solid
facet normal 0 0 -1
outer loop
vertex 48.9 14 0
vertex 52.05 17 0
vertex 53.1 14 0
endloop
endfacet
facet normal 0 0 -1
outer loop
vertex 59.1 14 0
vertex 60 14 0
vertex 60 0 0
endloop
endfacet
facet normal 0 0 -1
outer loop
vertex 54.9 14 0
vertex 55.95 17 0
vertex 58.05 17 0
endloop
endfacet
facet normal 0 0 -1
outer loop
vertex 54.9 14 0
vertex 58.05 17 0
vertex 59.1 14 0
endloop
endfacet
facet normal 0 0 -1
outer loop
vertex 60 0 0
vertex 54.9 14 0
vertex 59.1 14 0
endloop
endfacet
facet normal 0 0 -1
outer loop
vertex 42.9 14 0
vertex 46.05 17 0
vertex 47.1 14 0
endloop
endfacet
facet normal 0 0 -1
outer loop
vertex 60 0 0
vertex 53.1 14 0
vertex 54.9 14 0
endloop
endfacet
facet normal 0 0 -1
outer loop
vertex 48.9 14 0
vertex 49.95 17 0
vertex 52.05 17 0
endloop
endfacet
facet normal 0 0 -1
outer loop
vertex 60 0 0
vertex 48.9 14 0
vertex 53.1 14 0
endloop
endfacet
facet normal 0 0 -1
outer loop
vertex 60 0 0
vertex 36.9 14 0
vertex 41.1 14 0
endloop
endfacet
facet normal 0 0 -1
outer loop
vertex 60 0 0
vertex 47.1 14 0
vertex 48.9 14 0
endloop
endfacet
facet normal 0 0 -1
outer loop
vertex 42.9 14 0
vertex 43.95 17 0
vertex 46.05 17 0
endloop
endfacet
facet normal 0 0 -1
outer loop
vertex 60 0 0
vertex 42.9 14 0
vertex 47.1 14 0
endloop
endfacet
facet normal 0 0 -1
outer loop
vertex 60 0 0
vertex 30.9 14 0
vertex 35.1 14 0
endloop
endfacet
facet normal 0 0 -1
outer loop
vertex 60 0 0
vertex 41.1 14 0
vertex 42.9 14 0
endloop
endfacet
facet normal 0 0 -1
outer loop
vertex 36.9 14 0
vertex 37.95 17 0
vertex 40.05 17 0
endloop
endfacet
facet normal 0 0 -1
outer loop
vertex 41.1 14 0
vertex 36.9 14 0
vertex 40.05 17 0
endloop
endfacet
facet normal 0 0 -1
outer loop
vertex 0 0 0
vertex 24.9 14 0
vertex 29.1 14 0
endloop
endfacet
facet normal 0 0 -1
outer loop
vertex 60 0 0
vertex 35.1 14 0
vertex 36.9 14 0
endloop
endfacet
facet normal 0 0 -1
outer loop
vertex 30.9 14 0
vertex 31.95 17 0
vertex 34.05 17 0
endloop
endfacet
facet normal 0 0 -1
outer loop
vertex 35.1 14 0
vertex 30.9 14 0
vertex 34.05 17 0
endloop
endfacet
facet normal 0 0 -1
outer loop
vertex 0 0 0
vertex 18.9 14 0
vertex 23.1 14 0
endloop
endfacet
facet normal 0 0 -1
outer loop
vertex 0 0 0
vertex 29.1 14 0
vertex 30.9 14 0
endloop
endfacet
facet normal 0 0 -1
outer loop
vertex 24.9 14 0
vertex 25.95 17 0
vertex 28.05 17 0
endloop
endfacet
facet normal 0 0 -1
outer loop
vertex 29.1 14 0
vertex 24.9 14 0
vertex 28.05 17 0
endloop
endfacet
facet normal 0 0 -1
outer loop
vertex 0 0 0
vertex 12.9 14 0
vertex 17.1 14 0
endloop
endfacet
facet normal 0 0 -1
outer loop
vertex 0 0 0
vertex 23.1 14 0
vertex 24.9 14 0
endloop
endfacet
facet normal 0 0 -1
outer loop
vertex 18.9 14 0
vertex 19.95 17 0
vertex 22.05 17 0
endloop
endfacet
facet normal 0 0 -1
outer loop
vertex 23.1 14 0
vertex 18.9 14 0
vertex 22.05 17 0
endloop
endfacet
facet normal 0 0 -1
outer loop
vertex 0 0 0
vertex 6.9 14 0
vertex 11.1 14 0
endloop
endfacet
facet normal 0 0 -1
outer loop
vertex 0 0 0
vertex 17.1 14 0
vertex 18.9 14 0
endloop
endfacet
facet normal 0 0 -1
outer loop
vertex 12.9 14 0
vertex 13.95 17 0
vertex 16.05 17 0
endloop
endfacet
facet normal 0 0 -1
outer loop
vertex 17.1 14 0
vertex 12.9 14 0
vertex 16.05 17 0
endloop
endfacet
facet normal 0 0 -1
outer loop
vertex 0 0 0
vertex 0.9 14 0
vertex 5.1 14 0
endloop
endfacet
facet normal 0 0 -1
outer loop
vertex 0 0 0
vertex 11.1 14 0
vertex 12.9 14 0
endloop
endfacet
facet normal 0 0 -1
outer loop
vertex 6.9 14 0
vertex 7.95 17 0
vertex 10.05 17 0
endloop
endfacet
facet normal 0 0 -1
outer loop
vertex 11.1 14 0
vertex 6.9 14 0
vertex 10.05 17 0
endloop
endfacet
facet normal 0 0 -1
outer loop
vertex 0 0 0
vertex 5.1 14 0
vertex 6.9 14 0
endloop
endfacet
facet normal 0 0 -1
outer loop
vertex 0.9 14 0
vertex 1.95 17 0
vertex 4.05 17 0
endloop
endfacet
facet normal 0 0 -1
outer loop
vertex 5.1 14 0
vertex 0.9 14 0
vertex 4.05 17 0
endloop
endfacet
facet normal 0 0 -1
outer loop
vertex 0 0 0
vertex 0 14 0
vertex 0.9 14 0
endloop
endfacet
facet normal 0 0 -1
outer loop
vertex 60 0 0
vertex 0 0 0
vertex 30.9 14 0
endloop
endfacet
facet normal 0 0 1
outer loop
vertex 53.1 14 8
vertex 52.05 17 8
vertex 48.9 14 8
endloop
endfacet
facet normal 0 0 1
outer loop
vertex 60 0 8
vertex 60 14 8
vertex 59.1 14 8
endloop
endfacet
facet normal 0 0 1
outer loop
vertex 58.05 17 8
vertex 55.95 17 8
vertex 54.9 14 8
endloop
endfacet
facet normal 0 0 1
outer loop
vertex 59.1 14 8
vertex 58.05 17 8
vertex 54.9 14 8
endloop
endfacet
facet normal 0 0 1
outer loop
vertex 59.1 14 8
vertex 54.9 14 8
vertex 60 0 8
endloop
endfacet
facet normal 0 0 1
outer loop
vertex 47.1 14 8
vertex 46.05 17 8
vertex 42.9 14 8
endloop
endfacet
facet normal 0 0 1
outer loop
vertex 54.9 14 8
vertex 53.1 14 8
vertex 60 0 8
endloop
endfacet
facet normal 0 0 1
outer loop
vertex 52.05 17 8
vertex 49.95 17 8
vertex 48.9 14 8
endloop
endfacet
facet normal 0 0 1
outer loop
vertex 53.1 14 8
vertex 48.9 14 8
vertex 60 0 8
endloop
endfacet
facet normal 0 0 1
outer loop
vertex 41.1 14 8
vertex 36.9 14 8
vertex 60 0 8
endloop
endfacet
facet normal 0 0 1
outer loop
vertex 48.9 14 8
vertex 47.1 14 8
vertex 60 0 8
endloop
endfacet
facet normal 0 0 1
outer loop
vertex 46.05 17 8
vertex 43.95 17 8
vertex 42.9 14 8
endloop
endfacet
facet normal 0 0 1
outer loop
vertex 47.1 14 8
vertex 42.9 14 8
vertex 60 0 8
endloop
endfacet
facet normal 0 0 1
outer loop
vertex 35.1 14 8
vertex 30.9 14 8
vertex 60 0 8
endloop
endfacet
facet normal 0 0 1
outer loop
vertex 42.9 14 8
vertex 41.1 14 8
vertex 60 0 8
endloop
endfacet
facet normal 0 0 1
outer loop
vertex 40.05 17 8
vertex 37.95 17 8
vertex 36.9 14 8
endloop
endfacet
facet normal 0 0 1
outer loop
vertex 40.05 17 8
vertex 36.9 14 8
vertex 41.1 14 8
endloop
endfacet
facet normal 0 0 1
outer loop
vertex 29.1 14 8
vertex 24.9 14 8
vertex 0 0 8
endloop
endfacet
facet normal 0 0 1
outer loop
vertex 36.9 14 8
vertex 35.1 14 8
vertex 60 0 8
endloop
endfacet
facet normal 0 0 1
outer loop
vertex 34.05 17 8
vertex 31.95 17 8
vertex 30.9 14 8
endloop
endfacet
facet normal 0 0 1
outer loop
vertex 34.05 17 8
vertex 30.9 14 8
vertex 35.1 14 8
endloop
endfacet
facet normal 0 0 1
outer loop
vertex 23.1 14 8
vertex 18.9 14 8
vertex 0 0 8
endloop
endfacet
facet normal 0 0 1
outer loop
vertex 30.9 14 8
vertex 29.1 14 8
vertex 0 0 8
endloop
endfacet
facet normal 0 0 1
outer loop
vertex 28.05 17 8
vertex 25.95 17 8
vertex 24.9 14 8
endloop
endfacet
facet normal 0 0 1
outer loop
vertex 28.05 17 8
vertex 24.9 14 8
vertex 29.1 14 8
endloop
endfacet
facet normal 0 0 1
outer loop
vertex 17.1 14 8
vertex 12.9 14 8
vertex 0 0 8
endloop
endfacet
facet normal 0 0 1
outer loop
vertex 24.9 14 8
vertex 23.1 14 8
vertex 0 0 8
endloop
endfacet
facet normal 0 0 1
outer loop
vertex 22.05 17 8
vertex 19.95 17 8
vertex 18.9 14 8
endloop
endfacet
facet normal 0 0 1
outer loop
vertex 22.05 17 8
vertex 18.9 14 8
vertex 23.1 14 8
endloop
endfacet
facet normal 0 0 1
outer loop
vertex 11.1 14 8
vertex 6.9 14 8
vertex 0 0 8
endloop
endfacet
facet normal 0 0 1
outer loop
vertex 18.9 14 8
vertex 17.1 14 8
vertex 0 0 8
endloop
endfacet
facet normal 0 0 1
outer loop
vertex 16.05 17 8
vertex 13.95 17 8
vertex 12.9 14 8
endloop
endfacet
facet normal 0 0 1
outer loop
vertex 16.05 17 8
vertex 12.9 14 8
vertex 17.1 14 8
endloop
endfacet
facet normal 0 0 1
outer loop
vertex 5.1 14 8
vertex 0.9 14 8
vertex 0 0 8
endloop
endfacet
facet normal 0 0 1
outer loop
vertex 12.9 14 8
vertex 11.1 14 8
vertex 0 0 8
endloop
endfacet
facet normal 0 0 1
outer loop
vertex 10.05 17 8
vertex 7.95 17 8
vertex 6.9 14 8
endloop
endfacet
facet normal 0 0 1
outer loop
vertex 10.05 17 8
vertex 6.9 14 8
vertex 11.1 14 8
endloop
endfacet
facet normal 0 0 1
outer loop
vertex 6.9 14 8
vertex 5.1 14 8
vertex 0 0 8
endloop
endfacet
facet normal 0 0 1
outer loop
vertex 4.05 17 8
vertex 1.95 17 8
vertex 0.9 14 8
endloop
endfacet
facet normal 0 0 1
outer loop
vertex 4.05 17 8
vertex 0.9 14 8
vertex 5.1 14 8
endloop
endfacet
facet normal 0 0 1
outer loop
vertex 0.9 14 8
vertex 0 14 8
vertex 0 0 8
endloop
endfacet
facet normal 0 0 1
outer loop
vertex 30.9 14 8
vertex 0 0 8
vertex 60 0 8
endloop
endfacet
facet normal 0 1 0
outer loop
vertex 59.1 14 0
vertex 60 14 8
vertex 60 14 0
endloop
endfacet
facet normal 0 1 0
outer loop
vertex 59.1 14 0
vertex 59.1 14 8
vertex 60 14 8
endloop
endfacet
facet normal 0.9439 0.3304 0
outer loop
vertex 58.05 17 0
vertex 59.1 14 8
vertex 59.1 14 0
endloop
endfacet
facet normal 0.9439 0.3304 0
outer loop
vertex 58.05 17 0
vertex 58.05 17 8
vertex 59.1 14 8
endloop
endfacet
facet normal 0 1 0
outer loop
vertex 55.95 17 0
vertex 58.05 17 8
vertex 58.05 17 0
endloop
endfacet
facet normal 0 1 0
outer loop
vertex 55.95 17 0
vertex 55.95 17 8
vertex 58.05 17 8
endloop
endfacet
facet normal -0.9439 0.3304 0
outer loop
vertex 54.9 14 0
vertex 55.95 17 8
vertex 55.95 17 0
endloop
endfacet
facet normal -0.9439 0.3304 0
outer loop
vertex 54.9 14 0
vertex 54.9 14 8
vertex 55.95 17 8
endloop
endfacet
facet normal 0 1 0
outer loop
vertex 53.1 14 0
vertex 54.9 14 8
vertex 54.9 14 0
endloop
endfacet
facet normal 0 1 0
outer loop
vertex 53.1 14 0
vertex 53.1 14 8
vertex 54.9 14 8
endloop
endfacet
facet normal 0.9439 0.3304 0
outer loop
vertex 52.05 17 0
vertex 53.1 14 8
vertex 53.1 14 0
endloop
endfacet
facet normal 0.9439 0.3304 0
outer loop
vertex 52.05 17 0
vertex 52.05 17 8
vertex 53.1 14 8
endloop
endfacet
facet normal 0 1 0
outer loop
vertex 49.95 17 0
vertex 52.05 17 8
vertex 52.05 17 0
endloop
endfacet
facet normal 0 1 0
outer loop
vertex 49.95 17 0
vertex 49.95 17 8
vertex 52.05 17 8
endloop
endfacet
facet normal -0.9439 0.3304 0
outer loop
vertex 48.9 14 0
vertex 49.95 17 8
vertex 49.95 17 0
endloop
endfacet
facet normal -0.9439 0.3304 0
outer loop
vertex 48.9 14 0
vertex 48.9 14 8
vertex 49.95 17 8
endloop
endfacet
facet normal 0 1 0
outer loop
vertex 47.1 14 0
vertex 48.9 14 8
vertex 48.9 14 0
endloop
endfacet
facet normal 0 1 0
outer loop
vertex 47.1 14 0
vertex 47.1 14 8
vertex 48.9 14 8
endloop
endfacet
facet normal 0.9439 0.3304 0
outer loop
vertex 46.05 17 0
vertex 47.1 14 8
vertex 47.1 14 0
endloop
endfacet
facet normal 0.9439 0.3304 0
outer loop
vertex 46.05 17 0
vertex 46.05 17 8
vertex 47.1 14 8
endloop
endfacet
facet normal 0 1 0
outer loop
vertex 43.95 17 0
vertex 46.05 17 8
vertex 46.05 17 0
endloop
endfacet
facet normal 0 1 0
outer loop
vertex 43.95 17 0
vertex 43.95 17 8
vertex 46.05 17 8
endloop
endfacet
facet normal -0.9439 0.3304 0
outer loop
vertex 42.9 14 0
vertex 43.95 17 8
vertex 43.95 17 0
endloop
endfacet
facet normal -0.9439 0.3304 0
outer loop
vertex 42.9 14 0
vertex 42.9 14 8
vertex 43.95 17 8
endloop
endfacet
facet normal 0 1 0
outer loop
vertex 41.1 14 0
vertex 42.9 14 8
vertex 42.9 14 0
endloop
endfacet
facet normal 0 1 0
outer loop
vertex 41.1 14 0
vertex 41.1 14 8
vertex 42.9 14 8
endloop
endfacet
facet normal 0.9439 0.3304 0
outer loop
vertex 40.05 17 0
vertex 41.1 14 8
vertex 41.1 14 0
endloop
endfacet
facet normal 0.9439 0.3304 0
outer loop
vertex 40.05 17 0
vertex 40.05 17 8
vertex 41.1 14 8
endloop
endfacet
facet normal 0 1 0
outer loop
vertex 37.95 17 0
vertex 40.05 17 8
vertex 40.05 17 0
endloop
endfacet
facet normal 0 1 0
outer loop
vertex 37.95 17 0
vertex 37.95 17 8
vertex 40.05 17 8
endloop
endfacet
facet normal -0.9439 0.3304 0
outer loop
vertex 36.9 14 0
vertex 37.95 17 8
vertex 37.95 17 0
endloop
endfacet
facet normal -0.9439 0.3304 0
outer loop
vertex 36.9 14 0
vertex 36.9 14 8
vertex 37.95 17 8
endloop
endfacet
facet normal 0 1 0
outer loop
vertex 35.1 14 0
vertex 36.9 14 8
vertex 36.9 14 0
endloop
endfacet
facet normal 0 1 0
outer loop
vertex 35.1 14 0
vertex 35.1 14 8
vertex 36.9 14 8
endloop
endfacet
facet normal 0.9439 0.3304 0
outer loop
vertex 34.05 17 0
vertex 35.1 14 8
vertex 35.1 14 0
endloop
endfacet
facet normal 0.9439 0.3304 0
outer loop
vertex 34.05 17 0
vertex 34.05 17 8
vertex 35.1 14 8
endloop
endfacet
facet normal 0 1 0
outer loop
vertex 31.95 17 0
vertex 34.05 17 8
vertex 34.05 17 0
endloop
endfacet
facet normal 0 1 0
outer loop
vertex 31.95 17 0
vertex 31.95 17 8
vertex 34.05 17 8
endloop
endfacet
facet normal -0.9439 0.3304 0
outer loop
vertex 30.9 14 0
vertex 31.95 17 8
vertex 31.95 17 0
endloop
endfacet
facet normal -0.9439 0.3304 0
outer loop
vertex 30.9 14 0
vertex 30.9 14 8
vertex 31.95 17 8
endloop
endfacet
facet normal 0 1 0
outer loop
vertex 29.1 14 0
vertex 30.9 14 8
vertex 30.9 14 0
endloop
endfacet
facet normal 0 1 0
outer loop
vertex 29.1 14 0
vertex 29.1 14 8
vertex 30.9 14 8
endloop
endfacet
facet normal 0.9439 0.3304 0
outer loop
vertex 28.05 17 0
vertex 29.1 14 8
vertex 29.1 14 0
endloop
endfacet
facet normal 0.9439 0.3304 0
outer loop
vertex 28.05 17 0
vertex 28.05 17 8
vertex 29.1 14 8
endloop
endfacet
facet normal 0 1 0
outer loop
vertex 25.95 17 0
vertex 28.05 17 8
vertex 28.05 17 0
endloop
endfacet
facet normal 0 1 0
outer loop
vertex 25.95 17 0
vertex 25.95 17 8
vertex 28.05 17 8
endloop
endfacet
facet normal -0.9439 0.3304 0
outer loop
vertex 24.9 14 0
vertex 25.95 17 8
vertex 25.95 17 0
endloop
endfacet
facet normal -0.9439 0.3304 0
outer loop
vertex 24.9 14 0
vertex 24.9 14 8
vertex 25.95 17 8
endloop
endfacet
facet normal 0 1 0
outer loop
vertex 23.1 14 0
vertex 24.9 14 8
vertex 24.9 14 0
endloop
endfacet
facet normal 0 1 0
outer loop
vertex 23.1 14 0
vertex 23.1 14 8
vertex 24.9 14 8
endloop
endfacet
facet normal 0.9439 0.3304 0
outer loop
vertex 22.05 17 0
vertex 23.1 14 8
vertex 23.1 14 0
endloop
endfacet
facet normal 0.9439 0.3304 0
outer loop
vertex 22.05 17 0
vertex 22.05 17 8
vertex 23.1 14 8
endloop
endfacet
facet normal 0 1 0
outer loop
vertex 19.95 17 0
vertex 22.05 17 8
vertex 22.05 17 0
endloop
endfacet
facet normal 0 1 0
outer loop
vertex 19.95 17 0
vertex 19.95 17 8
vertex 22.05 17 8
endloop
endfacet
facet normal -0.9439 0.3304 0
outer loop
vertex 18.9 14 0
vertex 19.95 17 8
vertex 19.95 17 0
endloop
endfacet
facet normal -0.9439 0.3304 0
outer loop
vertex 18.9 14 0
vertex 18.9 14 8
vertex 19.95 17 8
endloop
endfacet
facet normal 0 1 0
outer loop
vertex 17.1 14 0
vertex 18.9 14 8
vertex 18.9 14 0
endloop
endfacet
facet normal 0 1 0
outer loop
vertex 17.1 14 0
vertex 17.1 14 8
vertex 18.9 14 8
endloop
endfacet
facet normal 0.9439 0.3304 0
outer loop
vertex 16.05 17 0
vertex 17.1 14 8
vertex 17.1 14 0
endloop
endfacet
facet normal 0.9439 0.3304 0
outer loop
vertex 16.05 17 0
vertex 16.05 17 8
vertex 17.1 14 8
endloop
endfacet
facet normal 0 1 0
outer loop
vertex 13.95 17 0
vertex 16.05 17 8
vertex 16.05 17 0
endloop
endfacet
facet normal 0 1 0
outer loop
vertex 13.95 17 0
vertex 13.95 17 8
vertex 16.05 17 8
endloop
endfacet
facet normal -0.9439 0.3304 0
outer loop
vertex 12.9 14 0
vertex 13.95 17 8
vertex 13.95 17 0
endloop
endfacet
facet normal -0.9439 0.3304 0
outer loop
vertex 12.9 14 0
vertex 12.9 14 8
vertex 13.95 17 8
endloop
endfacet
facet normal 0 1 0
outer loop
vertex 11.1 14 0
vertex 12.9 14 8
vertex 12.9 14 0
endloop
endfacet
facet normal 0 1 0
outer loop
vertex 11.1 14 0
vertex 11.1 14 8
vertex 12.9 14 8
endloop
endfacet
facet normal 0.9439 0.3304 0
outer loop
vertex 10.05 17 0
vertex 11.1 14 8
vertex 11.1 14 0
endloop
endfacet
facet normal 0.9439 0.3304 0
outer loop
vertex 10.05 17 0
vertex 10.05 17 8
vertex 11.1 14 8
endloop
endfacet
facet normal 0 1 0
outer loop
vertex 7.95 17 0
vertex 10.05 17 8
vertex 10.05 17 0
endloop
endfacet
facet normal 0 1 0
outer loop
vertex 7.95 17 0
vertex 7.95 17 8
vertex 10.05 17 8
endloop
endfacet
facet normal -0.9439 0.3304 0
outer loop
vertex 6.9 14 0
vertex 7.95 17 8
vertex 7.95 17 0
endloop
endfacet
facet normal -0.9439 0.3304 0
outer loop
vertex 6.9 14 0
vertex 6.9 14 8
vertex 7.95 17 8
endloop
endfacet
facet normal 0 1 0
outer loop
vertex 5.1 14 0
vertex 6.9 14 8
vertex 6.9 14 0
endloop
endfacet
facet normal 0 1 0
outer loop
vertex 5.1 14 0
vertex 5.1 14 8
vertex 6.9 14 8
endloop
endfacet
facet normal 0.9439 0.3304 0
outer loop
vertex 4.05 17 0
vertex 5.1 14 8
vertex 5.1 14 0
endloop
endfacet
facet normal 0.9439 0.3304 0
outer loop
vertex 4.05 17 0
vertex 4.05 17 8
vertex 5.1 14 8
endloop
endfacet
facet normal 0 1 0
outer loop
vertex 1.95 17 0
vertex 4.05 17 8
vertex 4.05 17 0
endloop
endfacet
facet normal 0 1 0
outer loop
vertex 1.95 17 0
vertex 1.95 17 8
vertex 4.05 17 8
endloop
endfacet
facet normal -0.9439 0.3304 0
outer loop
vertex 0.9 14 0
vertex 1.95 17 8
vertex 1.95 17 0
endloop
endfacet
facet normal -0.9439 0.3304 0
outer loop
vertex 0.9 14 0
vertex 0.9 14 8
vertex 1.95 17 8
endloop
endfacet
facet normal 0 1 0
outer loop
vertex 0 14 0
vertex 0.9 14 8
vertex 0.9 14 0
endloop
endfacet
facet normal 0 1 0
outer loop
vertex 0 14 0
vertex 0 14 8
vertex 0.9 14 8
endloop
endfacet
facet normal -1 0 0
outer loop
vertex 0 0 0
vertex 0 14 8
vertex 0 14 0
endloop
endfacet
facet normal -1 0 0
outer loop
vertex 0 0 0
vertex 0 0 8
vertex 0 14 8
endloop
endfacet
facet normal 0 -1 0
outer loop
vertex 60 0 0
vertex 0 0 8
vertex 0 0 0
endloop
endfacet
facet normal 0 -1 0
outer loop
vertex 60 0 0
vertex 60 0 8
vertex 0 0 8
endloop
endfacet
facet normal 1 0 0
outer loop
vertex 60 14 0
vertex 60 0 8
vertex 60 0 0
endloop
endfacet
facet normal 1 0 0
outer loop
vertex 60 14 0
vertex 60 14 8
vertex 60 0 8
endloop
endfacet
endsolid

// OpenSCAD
$fn = 32;

// ----------------------------------------------------------------------
// Gear rack: 10 teeth, pitch 6 mm
// ----------------------------------------------------------------------

// --- parameters (mm) ---
teeth = 10;               // number of teeth
pitch = 6;                // tooth pitch, X
root_w = 4.2;             // tooth width at the root
tip_w = 2.1;              // tooth width at the tip
base_h = 14;              // rack body height, Y
tooth_h = 3;              // tooth height above the body
plate_t = 8;              // rack width, Z (extrusion height)

rack_l = teeth * pitch;  // overall length
total_h = base_h + tooth_h;  // overall height

profile = [[0, 0], [60, 0], [60, 14], [59.1, 14], [58.05, 17], [55.95, 17], [54.9, 14], [53.1, 14], [52.05, 17], [49.95, 17], [48.9, 14], [47.1, 14], [46.05, 17], [43.95, 17], [42.9, 14], [41.1, 14], [40.05, 17], [37.95, 17], [36.9, 14], [35.1, 14], [34.05, 17], [31.95, 17], [30.9, 14], [29.1, 14], [28.05, 17], [25.95, 17], [24.9, 14], [23.1, 14], [22.05, 17], [19.95, 17], [18.9, 14], [17.1, 14], [16.05, 17], [13.95, 17], [12.9, 14], [11.1, 14], [10.05, 17], [7.95, 17], [6.9, 14], [5.1, 14], [4.05, 17], [1.95, 17], [0.9, 14], [0, 14]];  // primary outline, 44 points, counter clockwise

// --- the one profile operation ---
linear_extrude(height = plate_t) polygon(points = profile);
